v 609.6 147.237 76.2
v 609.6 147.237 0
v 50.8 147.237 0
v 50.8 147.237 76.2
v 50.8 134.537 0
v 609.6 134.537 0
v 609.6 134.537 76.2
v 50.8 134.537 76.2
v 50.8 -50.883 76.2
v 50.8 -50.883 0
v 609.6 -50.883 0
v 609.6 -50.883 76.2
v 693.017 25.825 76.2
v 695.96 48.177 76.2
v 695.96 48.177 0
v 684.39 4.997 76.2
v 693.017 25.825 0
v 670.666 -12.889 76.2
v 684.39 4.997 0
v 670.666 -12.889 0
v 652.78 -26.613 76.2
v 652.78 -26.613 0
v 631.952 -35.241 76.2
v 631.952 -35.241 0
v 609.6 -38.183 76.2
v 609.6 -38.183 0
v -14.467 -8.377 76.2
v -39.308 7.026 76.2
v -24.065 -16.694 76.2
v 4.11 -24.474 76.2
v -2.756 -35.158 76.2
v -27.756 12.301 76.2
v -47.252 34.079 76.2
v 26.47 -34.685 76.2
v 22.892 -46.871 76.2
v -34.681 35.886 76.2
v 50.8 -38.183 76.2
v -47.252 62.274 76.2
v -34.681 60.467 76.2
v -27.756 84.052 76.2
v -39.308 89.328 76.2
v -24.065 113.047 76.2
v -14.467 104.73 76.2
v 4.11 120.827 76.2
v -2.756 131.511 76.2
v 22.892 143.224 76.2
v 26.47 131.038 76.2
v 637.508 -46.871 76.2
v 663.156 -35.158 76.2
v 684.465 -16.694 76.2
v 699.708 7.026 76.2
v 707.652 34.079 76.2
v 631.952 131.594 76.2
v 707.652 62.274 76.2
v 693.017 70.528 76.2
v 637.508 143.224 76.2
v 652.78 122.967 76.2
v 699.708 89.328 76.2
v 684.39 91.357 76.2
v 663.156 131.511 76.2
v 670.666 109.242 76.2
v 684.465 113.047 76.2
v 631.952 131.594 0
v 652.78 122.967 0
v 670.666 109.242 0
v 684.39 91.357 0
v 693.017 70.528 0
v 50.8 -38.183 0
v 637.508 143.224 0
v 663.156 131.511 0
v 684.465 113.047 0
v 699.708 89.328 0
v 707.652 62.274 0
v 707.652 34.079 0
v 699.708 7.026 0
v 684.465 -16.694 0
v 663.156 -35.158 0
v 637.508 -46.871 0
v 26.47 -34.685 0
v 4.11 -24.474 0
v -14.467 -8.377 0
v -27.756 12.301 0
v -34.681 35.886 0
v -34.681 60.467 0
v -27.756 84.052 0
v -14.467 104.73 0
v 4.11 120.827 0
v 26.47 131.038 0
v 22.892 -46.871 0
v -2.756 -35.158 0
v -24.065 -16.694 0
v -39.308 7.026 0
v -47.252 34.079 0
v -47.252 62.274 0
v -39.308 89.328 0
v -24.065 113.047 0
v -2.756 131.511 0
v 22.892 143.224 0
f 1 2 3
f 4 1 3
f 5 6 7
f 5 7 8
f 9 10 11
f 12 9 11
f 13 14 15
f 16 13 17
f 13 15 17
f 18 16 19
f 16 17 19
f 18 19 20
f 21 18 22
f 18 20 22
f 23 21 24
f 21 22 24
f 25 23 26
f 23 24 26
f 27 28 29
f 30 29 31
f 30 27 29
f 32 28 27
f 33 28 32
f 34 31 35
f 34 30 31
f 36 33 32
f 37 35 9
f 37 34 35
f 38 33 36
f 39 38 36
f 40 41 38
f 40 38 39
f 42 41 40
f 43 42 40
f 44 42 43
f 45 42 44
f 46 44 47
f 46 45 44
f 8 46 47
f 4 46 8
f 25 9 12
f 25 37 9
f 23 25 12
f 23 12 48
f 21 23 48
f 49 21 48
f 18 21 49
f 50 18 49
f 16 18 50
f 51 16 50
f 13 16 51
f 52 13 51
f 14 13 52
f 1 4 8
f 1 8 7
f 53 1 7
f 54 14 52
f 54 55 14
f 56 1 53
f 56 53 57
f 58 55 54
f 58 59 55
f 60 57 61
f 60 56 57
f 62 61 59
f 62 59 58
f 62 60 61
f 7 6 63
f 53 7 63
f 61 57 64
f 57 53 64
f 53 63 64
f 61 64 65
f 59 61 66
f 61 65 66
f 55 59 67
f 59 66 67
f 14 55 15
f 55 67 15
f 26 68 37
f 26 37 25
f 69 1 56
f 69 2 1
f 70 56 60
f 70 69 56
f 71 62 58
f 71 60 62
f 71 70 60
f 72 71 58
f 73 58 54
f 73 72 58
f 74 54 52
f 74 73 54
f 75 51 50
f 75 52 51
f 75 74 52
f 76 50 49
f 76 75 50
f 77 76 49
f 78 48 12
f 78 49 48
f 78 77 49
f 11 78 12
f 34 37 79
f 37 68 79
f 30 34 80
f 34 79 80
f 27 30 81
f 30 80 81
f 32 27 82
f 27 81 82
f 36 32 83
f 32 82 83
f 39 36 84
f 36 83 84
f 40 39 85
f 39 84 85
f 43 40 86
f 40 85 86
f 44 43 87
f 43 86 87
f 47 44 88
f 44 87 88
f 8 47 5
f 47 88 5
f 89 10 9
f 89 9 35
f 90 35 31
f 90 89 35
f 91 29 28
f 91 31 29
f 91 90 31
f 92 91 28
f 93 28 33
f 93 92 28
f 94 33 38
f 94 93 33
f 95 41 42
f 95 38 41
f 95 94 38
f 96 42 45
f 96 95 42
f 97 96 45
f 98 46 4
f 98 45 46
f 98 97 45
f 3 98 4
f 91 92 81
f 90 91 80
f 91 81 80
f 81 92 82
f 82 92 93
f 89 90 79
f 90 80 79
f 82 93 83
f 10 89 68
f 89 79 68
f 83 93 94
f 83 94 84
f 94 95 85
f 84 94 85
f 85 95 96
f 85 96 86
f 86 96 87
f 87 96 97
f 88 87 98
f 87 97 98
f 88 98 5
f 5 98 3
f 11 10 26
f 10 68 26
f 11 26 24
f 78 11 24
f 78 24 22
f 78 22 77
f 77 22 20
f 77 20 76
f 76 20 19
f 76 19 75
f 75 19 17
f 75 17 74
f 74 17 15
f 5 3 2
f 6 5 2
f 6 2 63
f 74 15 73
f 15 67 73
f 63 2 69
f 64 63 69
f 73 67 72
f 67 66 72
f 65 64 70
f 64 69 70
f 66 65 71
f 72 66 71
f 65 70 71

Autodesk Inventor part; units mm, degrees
ref_plane "YZ Plane" through (0, 0, 0) normal (1, 0, 0) x (0, 1, 0)
ref_plane "XZ Plane" through (0, 0, 0) normal (0, 1, 0) x (-1, 0, 0)
ref_plane "XY Plane" through (0, 0, 0) normal (0, 0, 1) x (1, 0, 0)
sketch "Chassis" plane through (0, 0, 0) normal (0, 0, 1) x (1, 0, 0)
  line L0 (0, 0) -> (660.4, 0) construction
  line L1 (660.4, 0) -> (660.4, 152.4) construction
  line L2 (660.4, 152.4) -> (0, 152.4) construction
  line L3 (0, 152.4) -> (0, 0) construction
  line L4 (50.8, 127) -> (609.6, 127) construction
  line L5 (635, 101.6) -> (635, 50.8) construction
  line L6 (609.6, 25.4) -> (50.8, 25.4) construction
  line L7 (25.4, 50.8) -> (25.4, 101.6) construction
  arc A0 (50.8, 127) -> (25.4, 101.6) centre (50.8, 101.6) ccw construction
  arc A1 (25.4, 50.8) -> (50.8, 25.4) centre (50.8, 50.8) ccw construction
  arc A2 (609.6, 25.4) -> (635, 50.8) centre (609.6, 50.8) ccw construction
  arc A3 (635, 101.6) -> (609.6, 127) centre (609.6, 101.6) ccw construction
  dimension "d0" = 660.4
  dimension "d1" = 152.4
  dimension "d3" = 25.4
  dimension "d4" = 25.4
sketch "Motor and motor mount" plane through (0, 0, 0) normal (0, 0, 1) x (1, 0, 0)
  line L0 (152.5322, 25.4) -> (519.6657, 25.4) construction
  line L1 (519.6657, 25.4) -> (519.6657, 127) construction
  line L2 (519.6657, 127) -> (152.5322, 127) construction
  line L3 (152.5322, 127) -> (152.5322, 25.4) construction
  line L4 (152.5322, 31.75) -> (519.6657, 31.75) construction
  line L5 (168.5983, 31.75) -> (502.5549, 31.75) construction
  line L6 (502.5549, 31.75) -> (502.5549, 131.1076) construction
  line L7 (502.5549, 131.1076) -> (168.5983, 131.1076) construction
  line L8 (168.5983, 131.1076) -> (168.5983, 31.75) construction
  circle A0 centre (459.6569, 62.4006) radius 45.974 construction
  line L9 (50.8, 127) -> (609.6, 127) construction
  line L10 (168.5983, 121.0746) -> (502.5549, 121.0746) construction
  line L11 (76.2661, 152.2106) -> (76.2661, 127) construction
  line L12 (0, 152.4) -> (0, 0) construction
  line L13 (609.6, 25.4) -> (50.8, 25.4) construction
  circle A1 centre (459.6569, 62.4006) radius 6.35 construction
  point P0 (76.2661, 139.6053)
  dimension "d5" = 367.1334
  dimension "d6" = 101.6
  dimension "d8" = 6.35
  dimension "d9" = 333.9566
  dimension "d10" = 17.1108
  dimension "d12" = 42.898
  dimension "d14" = 4.1076
  dimension "d15" = 5.9254
  dimension "d16" = 58.674
  dimension "d17" = 76.2661
  dimension "d18" = 76.2661
  dimension "d19" = 91.948
  dimension "d20" = 12.7
sketch "Flipper drive rails" plane through (0, 0, 0) normal (0, 0, 1) x (1, 0, 0)
  circle A0 centre (609.6, 48.1766) radius 12.7 construction
  line L0 (660.4, 0) -> (660.4, 152.4) construction
  line L1 (0, 0) -> (660.4, 0) construction
  circle A1 centre (50.8, 48.1766) radius 12.7 construction
  line L2 (0, 152.4) -> (0, 0) construction
  circle A2 centre (50.8, 48.1766) radius 58.166 construction
  circle A3 centre (609.6, 48.1766) radius 58.166 construction
  circle A4 centre (459.6569, 62.4006) radius 45.974 construction
  dimension "d21" = 25.4
  dimension "d22" = 50.8
  dimension "d24" = 25.4
  dimension "d25" = 50.8
  dimension "d27" = 116.332
  dimension "d28" = 116.332
  dimension "d49" = 14.224
sketch "Flipper Gears" plane through (0, 0, 0) normal (0, 0, 1) x (1, 0, 0)
  circle A0 centre (172.9676, 98.1053) radius 29.845 construction
  circle A1 centre (217.0566, 68.0834) radius 23.495 construction
  circle A2 centre (132.7629, 49.7774) radius 33.02 construction
  circle A3 centre (132.7629, 49.7774) radius 23.8125 construction
  circle A4 centre (50.8, 48.1766) radius 58.166 construction
  circle A5 centre (609.6, 48.1766) radius 12.7 construction
  circle A6 centre (609.6, 48.1766) radius 86.36 construction
  circle A7 centre (502.1097, 24.0144) radius 23.8125 construction
  circle A8 centre (502.1097, 24.0144) radius 33.02 construction
  circle A9 centre (447.4639, 55.0924) radius 29.845 construction
  circle A10 centre (410.72, 16.4266) radius 23.495 construction
  line L0 (253.1246, 92.8334) -> (396.8286, 92.8334) construction
  line L1 (396.8286, 92.8334) -> (396.8286, 43.3334) construction
  line L2 (396.8286, 43.3334) -> (253.1246, 43.3334) construction
  line L3 (253.1246, 43.3334) -> (253.1246, 92.8334) construction
  line L4 (374.652, 16.4266) -> (410.72, 16.4266) construction
  line L5 (217.0566, 68.0834) -> (253.1246, 68.0834) construction
  line L6 (230.948, 41.1766) -> (374.652, 41.1766) construction
  line L7 (374.652, 41.1766) -> (374.652, -8.3234) construction
  line L8 (374.652, -8.3234) -> (230.948, -8.3234) construction
  line L9 (230.948, -8.3234) -> (230.948, 41.1766) construction
  circle A11 centre (50.8, 48.1766) radius 86.36 construction
  line L10 (50.8, 48.1766) -> (609.6, 48.1766) construction
  line L11 (50.8, -50.8834) -> (609.6, -50.8834) construction
  line L12 (609.6, 147.2366) -> (50.8, 147.2366) construction
  arc A12 (50.8, 147.2366) -> (50.8, -50.8834) centre (50.8, 48.1766) ccw construction
  arc A13 (609.6, -50.8834) -> (609.6, 147.2366) centre (609.6, 48.1766) ccw construction
  circle A14 centre (50.8, 48.1766) radius 99.06 construction
  line L13 (50.8, 48.1766) -> (609.6, 48.1766) construction
  line L14 (50.8, -38.1834) -> (609.6, -38.1834) construction
  line L15 (609.6, 134.5366) -> (50.8, 134.5366) construction
  arc A15 (50.8, 134.5366) -> (50.8, -38.1834) centre (50.8, 48.1766) ccw construction
  arc A16 (609.6, -38.1834) -> (609.6, 134.5366) centre (609.6, 48.1766) ccw construction
  point P0 (0, 0)
  point P1 (330.2, 48.1766)
  point P2 (330.2, 48.1766)
  dimension "d29" = 59.69
  dimension "d30" = 46.99
  dimension "d31" = 66.04
  dimension "d32" = 47.625
  dimension "d34" = 172.72
  dimension "d35" = 47.625
  dimension "d36" = 66.04
  dimension "d37" = 59.69
  dimension "d38" = 46.99
  dimension "d39" = 143.704
  dimension "d40" = 49.5
  dimension "d43" = 36.068
  dimension "d48" = 24.1623
  dimension "d50" = 31.75
  dimension "d51" = 38.6658
  dimension "d52" = 143.704
  dimension "d53" = 49.5
  dimension "d54" = 36.068
  dimension "d55" = 51.6568
  dimension "d60" = 172.72
  dimension "d62" = 12.7
sketch "Flipper" plane through (0, 0, 0) normal (0, 0, 1) x (1, 0, 0)
  circle A0 centre (50.8, 48.1766) radius 63.5 construction
  circle A1 centre (-195.1482, 3.0916) radius 41.275 construction
  circle A2 centre (50.8, 48.1766) radius 86.36 construction
  line L0 (-195.1482, -38.1834) -> (50.8, -38.1834) construction
  point P0 (0, 0)
  point P1 (609.6, 48.1766)
  dimension "d57" = 82.55
  dimension "d58" = 172.72
  dimension "d56" = 127
  dimension "d59" = 245.9482
sketch "Sketch6" plane through (0, 0, 0) normal (0, 0, 1) x (1, 0, 0)
  line L0 (609.6, 147.2366) -> (50.8, 147.2366) projected
  arc A0 (50.8, 147.2366) -> (50.8, -50.8834) centre (50.8, 48.1766) ccw projected
  line L1 (609.6, 134.5366) -> (50.8, 134.5366) projected
  circle A1 centre (50.8, 48.1766) radius 86.36 projected
  line L2 (50.8, -38.1834) -> (609.6, -38.1834) projected
  line L3 (50.8, -50.8834) -> (609.6, -50.8834) projected
  arc A2 (609.6, -50.8834) -> (609.6, 147.2366) centre (609.6, 48.1766) ccw projected
  circle A3 centre (609.6, 48.1766) radius 86.36 projected
  point P0 (0, 0)
extrude "Extrusion1" add sketch "Sketch6" along normal blind 76.2
properties part number "MasterSketch"
